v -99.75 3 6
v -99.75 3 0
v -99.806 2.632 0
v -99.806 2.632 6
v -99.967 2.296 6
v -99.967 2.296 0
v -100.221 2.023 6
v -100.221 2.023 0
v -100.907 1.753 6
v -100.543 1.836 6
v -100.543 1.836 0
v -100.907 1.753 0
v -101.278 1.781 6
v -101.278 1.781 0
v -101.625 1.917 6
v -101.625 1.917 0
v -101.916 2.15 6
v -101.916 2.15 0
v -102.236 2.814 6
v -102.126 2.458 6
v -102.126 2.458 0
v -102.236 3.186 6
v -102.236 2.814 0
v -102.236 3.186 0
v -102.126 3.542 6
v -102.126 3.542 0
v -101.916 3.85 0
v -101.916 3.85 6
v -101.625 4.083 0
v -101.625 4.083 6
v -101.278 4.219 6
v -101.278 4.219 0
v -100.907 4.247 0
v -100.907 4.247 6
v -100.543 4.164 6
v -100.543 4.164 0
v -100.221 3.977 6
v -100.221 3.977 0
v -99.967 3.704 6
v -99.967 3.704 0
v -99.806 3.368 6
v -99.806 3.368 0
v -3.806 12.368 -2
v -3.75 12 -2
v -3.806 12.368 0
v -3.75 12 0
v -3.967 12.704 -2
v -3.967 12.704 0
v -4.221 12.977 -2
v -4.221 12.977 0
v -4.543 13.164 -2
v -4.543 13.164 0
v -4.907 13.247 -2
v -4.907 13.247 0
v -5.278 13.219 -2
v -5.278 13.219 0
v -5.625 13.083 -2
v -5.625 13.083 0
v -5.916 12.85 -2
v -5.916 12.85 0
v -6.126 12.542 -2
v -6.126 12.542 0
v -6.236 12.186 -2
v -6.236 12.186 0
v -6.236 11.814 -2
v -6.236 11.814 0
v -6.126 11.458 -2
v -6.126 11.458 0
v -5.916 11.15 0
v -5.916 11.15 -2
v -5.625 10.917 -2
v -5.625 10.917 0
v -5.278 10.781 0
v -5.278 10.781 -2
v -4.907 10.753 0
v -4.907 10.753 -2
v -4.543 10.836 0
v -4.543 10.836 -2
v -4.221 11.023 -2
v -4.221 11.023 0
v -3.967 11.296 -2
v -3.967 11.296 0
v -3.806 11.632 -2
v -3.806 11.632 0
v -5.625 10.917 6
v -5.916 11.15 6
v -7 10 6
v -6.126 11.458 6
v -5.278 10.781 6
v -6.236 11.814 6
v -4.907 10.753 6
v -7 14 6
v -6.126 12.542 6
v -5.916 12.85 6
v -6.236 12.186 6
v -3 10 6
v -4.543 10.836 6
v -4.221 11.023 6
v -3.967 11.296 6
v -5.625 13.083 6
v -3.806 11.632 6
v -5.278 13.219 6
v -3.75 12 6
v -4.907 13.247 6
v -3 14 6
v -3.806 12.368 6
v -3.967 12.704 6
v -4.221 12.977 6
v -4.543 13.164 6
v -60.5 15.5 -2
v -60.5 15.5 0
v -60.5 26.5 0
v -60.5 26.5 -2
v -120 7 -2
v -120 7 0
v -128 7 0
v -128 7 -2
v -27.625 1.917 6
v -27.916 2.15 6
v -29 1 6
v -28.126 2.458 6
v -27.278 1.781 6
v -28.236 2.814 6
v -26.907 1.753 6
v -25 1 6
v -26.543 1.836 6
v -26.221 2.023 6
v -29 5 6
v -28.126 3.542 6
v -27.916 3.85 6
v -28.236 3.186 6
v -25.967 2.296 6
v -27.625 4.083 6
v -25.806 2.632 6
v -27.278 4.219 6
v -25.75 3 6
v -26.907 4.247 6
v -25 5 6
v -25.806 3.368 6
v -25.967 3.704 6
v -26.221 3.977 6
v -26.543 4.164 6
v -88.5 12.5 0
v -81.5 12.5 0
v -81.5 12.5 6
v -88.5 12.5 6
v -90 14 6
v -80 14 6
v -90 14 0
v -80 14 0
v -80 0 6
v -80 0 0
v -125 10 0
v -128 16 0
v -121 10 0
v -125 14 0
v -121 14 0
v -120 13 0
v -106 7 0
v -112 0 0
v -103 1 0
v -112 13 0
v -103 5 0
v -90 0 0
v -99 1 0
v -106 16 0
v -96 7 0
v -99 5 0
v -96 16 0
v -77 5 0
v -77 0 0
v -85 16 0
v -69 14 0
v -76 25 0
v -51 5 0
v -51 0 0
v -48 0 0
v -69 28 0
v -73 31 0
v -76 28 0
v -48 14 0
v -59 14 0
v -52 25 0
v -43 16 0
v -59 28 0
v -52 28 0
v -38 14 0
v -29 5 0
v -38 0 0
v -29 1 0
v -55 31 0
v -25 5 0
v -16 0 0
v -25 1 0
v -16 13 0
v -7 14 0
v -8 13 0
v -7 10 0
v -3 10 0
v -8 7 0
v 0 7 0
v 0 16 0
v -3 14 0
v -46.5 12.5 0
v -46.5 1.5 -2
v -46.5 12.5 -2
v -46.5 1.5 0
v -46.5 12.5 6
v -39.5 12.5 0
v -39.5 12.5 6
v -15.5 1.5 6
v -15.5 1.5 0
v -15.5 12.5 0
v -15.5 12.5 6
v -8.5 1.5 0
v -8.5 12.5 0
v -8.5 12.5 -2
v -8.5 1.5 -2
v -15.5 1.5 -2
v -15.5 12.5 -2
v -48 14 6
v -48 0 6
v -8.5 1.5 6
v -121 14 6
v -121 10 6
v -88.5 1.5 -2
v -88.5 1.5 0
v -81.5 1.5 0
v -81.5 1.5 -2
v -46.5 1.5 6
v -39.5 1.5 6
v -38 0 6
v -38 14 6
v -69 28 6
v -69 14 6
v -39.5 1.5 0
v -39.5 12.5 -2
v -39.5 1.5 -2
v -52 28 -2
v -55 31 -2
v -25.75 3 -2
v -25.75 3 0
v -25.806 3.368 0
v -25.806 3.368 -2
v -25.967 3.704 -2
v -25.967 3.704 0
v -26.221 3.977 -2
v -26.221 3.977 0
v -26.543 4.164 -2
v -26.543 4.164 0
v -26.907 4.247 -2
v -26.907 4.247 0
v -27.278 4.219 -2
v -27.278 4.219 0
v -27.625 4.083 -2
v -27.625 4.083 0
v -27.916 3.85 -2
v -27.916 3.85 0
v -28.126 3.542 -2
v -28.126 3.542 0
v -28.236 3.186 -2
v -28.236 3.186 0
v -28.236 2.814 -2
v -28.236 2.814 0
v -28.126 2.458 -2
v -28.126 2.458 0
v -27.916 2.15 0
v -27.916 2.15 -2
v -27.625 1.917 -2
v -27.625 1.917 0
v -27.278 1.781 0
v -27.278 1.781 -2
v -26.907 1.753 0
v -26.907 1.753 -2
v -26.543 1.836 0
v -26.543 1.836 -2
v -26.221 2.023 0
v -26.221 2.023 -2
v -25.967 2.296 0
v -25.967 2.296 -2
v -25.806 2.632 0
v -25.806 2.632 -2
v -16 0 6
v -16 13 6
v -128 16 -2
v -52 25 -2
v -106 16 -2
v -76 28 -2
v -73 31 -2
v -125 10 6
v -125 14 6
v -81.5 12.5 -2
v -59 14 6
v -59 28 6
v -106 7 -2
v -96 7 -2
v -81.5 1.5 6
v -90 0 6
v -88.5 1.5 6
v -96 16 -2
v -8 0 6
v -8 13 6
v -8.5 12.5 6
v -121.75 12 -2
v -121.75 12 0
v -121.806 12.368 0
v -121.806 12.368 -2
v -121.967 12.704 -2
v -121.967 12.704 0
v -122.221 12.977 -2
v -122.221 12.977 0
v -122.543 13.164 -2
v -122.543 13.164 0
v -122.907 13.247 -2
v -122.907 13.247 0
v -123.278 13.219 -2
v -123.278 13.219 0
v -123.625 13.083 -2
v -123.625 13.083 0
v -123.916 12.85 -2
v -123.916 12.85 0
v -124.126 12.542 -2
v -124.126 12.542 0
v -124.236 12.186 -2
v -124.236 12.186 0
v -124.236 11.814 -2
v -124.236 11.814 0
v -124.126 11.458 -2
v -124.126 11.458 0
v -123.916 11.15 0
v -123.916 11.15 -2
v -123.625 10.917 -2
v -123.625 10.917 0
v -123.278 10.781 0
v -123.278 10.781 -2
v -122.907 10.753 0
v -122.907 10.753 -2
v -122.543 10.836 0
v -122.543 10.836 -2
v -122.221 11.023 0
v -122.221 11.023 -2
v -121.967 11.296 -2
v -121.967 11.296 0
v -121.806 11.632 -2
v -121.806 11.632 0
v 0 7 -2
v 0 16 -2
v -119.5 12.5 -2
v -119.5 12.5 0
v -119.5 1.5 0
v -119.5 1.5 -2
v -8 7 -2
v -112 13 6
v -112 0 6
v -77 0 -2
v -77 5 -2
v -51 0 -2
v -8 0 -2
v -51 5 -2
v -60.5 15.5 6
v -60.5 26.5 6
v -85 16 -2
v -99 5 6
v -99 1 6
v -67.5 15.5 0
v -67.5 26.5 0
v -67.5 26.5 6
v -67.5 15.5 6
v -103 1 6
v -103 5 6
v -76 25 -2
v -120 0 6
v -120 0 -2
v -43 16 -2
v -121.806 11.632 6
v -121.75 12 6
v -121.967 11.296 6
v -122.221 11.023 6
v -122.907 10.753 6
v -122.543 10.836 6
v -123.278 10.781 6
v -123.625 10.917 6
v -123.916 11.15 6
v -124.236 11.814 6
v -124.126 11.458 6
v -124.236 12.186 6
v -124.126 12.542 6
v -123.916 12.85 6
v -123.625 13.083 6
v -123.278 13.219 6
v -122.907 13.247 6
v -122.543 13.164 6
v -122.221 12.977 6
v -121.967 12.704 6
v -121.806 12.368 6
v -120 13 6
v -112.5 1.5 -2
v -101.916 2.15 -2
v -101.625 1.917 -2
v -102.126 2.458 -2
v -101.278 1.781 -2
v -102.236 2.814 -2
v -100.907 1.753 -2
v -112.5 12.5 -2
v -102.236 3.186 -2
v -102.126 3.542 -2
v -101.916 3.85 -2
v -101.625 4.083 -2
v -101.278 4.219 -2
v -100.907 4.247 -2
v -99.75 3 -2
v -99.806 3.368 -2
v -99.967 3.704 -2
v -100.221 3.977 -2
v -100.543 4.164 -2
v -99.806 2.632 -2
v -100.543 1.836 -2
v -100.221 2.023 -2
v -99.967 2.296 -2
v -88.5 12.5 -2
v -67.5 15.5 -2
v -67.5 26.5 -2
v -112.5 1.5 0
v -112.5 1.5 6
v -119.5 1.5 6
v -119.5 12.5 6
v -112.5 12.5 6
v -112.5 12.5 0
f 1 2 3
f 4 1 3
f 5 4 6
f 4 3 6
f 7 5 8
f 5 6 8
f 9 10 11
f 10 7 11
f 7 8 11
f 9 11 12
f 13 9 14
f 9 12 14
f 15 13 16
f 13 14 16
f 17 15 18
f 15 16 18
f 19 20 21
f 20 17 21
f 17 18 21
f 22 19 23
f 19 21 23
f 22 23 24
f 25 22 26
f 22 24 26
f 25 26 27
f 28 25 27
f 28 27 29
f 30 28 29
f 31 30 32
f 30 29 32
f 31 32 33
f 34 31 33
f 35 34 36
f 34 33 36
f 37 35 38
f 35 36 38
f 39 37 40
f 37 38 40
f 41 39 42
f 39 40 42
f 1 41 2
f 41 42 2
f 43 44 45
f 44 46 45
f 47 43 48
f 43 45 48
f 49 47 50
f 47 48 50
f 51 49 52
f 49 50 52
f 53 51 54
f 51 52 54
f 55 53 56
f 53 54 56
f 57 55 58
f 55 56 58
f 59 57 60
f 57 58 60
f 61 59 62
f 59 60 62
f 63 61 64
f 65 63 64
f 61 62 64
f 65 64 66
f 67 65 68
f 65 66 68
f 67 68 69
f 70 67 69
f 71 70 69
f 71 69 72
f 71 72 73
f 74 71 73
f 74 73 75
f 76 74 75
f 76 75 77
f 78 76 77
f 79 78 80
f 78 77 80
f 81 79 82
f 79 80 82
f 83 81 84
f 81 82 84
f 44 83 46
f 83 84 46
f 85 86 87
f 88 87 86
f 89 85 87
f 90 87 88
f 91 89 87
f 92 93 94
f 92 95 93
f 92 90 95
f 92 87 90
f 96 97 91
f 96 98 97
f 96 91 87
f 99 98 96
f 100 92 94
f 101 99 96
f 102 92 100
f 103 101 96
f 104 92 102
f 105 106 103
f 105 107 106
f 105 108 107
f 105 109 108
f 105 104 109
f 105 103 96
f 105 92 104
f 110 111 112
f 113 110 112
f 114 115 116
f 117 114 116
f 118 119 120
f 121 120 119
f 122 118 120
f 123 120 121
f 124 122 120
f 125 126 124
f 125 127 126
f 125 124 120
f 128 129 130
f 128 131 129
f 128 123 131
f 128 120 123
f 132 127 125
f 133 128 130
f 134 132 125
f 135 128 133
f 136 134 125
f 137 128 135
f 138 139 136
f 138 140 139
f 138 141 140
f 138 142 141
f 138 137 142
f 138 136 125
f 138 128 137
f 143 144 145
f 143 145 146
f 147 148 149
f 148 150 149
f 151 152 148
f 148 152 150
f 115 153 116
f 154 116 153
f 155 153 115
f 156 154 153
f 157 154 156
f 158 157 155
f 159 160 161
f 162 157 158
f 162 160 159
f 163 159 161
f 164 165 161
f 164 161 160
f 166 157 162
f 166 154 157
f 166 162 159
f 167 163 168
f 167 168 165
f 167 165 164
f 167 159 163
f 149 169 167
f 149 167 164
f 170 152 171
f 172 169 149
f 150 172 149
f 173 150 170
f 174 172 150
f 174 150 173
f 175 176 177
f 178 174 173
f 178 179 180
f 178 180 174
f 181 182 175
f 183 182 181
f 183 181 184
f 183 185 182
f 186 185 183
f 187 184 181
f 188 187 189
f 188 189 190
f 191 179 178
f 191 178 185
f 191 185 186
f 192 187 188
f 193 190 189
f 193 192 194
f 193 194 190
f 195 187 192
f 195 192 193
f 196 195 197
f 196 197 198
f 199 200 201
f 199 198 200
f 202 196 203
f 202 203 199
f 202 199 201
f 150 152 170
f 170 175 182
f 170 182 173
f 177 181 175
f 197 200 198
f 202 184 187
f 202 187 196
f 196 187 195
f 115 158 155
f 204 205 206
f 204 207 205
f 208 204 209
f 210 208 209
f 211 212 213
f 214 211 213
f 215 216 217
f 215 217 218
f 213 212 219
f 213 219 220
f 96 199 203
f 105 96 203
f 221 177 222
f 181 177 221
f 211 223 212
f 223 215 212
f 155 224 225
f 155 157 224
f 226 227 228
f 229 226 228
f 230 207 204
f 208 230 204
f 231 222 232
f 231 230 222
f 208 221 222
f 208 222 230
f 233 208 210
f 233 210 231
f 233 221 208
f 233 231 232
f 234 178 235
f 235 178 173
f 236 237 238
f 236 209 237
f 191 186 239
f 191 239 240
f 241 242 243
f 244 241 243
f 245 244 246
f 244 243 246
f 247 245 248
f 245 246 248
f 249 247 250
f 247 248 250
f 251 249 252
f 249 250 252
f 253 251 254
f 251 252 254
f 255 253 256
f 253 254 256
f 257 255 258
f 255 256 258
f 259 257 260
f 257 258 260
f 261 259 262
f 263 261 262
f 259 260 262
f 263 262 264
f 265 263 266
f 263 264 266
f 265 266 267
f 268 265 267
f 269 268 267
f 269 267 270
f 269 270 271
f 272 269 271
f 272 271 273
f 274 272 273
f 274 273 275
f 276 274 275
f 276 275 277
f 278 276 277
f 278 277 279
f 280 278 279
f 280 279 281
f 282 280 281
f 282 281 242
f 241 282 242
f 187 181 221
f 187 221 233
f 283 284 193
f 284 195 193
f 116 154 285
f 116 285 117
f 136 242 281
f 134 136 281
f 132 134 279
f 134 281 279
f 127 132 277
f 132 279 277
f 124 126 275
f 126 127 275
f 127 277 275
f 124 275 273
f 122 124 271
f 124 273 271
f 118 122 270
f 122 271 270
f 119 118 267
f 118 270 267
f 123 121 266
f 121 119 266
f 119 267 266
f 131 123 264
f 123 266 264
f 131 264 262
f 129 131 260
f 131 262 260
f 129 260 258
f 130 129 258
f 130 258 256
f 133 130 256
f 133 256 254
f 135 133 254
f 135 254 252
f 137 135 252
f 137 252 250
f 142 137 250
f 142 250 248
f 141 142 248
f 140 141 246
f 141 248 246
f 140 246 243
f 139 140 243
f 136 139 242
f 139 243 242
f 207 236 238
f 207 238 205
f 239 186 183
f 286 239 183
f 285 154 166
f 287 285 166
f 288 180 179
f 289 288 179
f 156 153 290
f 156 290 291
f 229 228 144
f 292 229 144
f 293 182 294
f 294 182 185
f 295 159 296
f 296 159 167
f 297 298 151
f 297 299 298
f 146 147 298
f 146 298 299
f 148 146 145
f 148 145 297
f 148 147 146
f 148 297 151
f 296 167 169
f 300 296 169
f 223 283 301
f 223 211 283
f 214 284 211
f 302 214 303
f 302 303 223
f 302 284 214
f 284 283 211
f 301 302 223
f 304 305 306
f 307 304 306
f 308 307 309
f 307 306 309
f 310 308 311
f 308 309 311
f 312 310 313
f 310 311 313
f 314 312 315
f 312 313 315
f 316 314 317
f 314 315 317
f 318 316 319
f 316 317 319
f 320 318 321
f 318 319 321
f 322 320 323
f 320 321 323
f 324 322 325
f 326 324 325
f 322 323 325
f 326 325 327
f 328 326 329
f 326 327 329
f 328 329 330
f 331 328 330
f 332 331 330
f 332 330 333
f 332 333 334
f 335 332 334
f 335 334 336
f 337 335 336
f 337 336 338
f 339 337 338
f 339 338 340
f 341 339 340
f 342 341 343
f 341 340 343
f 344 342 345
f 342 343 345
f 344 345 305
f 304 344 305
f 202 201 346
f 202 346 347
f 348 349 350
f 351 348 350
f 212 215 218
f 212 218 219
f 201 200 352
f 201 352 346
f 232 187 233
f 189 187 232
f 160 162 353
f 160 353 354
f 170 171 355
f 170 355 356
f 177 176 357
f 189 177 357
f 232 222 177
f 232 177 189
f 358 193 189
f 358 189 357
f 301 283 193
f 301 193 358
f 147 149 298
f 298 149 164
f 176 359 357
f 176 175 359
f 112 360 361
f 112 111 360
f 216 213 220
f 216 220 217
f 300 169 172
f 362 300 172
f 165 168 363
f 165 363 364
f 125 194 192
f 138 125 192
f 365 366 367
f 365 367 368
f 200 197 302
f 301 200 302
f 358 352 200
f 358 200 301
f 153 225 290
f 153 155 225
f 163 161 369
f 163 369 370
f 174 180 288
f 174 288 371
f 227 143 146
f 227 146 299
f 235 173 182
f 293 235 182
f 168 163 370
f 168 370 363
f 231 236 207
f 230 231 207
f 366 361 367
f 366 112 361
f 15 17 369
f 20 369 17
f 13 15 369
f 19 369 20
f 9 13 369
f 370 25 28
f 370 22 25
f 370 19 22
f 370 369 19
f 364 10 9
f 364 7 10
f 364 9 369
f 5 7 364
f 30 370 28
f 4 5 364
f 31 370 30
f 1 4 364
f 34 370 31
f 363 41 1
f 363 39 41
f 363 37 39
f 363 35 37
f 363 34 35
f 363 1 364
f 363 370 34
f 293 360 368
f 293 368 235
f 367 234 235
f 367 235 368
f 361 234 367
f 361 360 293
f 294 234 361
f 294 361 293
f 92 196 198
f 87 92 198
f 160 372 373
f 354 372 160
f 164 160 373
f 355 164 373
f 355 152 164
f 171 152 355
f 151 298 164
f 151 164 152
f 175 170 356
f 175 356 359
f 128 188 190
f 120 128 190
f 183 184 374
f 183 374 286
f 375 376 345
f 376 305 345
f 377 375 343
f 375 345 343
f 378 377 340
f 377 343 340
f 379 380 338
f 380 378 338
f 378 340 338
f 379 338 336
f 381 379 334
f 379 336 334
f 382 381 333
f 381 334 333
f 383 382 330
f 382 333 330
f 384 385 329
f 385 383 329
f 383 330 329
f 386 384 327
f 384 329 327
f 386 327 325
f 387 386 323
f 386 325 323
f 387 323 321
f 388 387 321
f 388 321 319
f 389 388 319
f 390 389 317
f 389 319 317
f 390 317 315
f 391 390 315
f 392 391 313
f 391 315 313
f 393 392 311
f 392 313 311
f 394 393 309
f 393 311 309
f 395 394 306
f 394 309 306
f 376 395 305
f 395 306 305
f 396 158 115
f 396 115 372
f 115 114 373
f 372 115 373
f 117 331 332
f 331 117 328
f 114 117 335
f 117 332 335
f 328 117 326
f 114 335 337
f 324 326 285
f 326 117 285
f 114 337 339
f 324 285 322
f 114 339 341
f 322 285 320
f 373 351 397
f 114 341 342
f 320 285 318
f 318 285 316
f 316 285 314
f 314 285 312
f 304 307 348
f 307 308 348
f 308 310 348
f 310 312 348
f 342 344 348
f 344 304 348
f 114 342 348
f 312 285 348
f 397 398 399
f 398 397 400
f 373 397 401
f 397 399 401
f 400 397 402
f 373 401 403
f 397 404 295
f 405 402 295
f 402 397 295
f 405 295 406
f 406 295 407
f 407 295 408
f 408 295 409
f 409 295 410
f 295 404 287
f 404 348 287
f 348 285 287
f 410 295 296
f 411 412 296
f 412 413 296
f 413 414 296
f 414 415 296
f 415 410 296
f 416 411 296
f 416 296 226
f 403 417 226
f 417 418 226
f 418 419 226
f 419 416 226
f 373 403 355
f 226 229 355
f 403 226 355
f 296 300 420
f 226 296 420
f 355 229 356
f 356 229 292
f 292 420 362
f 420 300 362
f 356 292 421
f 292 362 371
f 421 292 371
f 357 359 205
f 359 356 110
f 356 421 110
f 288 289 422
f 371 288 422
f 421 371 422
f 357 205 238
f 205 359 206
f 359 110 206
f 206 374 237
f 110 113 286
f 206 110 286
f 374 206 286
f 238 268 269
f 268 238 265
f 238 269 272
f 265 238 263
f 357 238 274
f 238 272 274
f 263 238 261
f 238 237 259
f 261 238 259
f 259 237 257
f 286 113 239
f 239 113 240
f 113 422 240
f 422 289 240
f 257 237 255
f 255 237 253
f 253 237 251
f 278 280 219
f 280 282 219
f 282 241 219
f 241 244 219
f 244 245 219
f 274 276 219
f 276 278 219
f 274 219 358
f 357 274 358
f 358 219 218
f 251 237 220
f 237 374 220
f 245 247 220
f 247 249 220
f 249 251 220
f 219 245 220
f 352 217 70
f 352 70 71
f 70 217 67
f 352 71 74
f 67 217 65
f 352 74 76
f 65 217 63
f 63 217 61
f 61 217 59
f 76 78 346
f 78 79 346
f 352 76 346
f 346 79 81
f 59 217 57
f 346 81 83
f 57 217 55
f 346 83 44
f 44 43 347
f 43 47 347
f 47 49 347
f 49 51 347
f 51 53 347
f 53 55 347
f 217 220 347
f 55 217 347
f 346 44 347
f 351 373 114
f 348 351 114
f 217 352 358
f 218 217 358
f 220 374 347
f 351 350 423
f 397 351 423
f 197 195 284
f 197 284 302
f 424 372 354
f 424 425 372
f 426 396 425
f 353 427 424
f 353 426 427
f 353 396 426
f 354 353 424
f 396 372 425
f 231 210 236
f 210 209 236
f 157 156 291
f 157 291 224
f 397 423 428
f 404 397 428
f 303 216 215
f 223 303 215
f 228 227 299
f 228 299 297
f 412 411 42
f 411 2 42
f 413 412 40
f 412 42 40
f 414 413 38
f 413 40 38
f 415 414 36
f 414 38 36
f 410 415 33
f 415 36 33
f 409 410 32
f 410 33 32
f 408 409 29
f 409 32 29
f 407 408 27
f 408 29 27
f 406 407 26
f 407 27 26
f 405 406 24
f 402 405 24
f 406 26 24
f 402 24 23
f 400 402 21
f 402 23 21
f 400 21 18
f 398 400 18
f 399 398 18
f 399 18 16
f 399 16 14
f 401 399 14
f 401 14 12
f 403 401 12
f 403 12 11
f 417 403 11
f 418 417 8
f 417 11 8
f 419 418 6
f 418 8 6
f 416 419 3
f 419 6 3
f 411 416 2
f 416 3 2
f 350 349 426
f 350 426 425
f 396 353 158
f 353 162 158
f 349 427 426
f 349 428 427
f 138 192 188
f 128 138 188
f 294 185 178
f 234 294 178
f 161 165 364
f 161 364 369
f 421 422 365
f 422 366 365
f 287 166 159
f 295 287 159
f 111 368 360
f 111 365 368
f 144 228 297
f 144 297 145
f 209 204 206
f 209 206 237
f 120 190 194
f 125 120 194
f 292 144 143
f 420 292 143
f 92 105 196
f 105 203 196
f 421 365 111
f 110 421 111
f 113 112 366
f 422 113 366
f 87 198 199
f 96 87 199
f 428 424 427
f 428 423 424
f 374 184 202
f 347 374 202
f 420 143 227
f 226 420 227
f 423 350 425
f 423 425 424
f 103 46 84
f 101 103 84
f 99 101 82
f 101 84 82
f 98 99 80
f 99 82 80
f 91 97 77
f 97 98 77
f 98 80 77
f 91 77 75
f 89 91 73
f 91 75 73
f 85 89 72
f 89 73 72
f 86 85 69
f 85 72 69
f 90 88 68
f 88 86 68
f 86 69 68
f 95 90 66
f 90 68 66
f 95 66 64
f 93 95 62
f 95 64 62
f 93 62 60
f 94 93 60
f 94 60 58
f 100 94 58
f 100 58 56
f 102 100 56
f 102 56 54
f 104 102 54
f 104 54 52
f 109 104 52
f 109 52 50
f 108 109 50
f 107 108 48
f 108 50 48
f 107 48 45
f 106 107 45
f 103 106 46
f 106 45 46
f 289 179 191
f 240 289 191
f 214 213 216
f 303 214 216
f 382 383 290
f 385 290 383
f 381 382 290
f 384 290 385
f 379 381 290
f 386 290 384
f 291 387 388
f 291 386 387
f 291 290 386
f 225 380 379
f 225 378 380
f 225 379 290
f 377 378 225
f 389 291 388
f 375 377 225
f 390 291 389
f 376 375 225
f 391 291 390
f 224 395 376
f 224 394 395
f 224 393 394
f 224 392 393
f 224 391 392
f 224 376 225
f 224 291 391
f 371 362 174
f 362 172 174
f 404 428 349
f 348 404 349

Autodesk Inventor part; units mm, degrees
ref_plane "YZ Plane" through (0, 0, 0) normal (1, 0, 0) x (0, 1, 0)
ref_plane "XZ Plane" through (0, 0, 0) normal (0, 1, 0) x (-1, 0, 0)
ref_plane "XY Plane" through (0, 0, 0) normal (0, 0, 1) x (1, 0, 0)
sketch "Sketch1" plane through (0, 0, 0) normal (0, 0, 1) x (1, 0, 0)
  line L0 (-64, 31) -> (-73, 31)
  line L1 (-76, 28) -> (-76, 25)
  line L2 (-85, 16) -> (-76, 25)
  line L3 (-76, 28) -> (-73, 31)
  line L4 (-64, 31) -> (-55, 31)
  line L5 (-52, 28) -> (-52, 25)
  line L6 (-43, 16) -> (-52, 25)
  line L7 (-52, 28) -> (-55, 31)
  line L8 (-43, 16) -> (0, 16)
  line L9 (-77, 0) -> (-77, 5)
  line L10 (-77, 5) -> (-51, 5)
  line L11 (-51, 5) -> (-51, 0)
  line L12 (-106, 16) -> (-106, 7)
  line L13 (-106, 7) -> (-96, 7)
  line L14 (-96, 7) -> (-96, 16)
  line L15 (-128, 16) -> (-106, 16)
  line L16 (-96, 16) -> (-85, 16)
  line L17 (-120, 0) -> (-120, 7)
  line L18 (-120, 7) -> (-128, 7)
  line L19 (-120, 0) -> (-77, 0)
  line L20 (-128, 16) -> (-128, 7)
  line L21 (-8, 0) -> (-8, 7)
  line L22 (-8, 7) -> (0, 7)
  line L23 (-51, 0) -> (-8, 0)
  line L24 (0, 7) -> (0, 16)
  point P0 (0, 0)
  dimension "d0" = 128
  dimension "d6" = 3
  dimension "d67" = 5
  dimension "d71" = 22
  dimension "d74" = 9
  dimension "d75" = 10
  dimension "d93" = 7
  dimension "d94" = 8
  dimension "d95" = 7
extrude "Extrusion1" add sketch "Sketch1" against normal blind 2
sketch "Sketch2" plane through (0, 0, 0) normal (0, 0, 1) x (1, 0, 0)
  line L0 (-121, 10) -> (-125, 10)
  line L1 (-125, 10) -> (-125, 14)
  line L2 (-125, 14) -> (-121, 14)
  line L3 (-121, 14) -> (-121, 10)
  line L4 (-90, 0) -> (-80, 0)
  line L5 (-80, 0) -> (-80, 14)
  line L6 (-80, 14) -> (-90, 14)
  line L7 (-90, 14) -> (-90, 0)
  line L8 (-99, 1) -> (-103, 1)
  line L9 (-103, 1) -> (-103, 5)
  line L10 (-103, 5) -> (-99, 5)
  line L11 (-99, 5) -> (-99, 1)
  line L12 (-7, 10) -> (-3, 10)
  line L13 (-3, 10) -> (-3, 14)
  line L14 (-3, 14) -> (-7, 14)
  line L15 (-7, 14) -> (-7, 10)
  line L16 (-29, 1) -> (-25, 1)
  line L17 (-25, 1) -> (-25, 5)
  line L18 (-25, 5) -> (-29, 5)
  line L19 (-29, 5) -> (-29, 1)
  line L20 (-112, 13) -> (-120, 13)
  line L21 (-120, 13) -> (-120, 0)
  line L22 (-112, 13) -> (-112, 0)
  circle A0 centre (-123, 12) radius 1.25
  circle A1 centre (-101, 3) radius 1.25
  circle A2 centre (-27, 3) radius 1.25
  circle A3 centre (-5, 12) radius 1.25
  line L23 (-120, 0) -> (-112, 0)
  line L24 (-119.5, 12.5) -> (-119.5, 1.5)
  line L25 (-119.5, 1.5) -> (-112.5, 1.5)
  line L26 (-112.5, 1.5) -> (-112.5, 12.5)
  line L27 (-112.5, 12.5) -> (-119.5, 12.5)
  line L28 (-88.5, 12.5) -> (-88.5, 1.5)
  line L29 (-88.5, 1.5) -> (-81.5, 1.5)
  line L30 (-81.5, 1.5) -> (-81.5, 12.5)
  line L31 (-81.5, 12.5) -> (-88.5, 12.5)
  line L32 (-69, 14) -> (-59, 14)
  line L33 (-59, 14) -> (-59, 28)
  line L34 (-59, 28) -> (-69, 28)
  line L35 (-69, 28) -> (-69, 14)
  line L36 (-67.5, 26.5) -> (-67.5, 15.5)
  line L37 (-67.5, 15.5) -> (-60.5, 15.5)
  line L38 (-60.5, 15.5) -> (-60.5, 26.5)
  line L39 (-60.5, 26.5) -> (-67.5, 26.5)
  line L40 (-38, 0) -> (-48, 0)
  line L41 (-48, 0) -> (-48, 14)
  line L42 (-48, 14) -> (-38, 14)
  line L43 (-38, 14) -> (-38, 0)
  line L44 (-16, 13) -> (-8, 13)
  line L45 (-8, 13) -> (-8, 0)
  line L46 (-16, 13) -> (-16, 0)
  line L47 (-8, 0) -> (-16, 0)
  line L48 (-8.5, 12.5) -> (-8.5, 1.5)
  line L49 (-8.5, 1.5) -> (-15.5, 1.5)
  line L50 (-15.5, 1.5) -> (-15.5, 12.5)
  line L51 (-15.5, 12.5) -> (-8.5, 12.5)
  line L52 (-39.5, 12.5) -> (-39.5, 1.5)
  line L53 (-39.5, 1.5) -> (-46.5, 1.5)
  line L54 (-46.5, 1.5) -> (-46.5, 12.5)
  line L55 (-46.5, 12.5) -> (-39.5, 12.5)
  dimension "d49" = 2.5
  dimension "d50" = 2.5
  dimension "d51" = 2.5
  dimension "d52" = 2.5
  dimension "d69" = 13
sketch "Sketch10" plane through (0, 0, 0) normal (0, 0, 1) x (1, 0, 0)
  line L0 (-121, 10) -> (-125, 10)
  line L1 (-125, 10) -> (-125, 14)
  line L2 (-125, 14) -> (-121, 14)
  line L3 (-121, 14) -> (-121, 10)
  line L4 (-25, 1) -> (-25, 5)
  line L5 (-7, 14) -> (-7, 10)
  line L6 (-7, 10) -> (-3, 10)
  line L7 (-3, 10) -> (-3, 14)
  line L8 (-3, 14) -> (-7, 14)
  line L9 (-29, 1) -> (-25, 1)
  line L10 (-25, 5) -> (-29, 5)
  line L11 (-29, 5) -> (-29, 1)
  circle A0 centre (-123, 12) radius 1.25
  circle A1 centre (-27, 3) radius 1.25
  circle A2 centre (-5, 12) radius 1.25
  line L12 (-90, 0) -> (-80, 0)
  line L13 (-80, 0) -> (-80, 14)
  line L14 (-80, 14) -> (-90, 14)
  line L15 (-90, 14) -> (-90, 0)
  line L16 (-99, 1) -> (-103, 1)
  line L17 (-103, 1) -> (-103, 5)
  line L18 (-103, 5) -> (-99, 5)
  line L19 (-99, 5) -> (-99, 1)
  line L20 (-112, 13) -> (-120, 13)
  line L21 (-120, 13) -> (-120, 0)
  line L22 (-112, 13) -> (-112, 0)
  circle A3 centre (-101, 3) radius 1.25
  line L23 (-120, 0) -> (-112, 0)
  line L24 (-119.5, 12.5) -> (-119.5, 1.5)
  line L25 (-119.5, 1.5) -> (-112.5, 1.5)
  line L26 (-112.5, 1.5) -> (-112.5, 12.5)
  line L27 (-112.5, 12.5) -> (-119.5, 12.5)
  line L28 (-88.5, 12.5) -> (-88.5, 1.5)
  line L29 (-88.5, 1.5) -> (-81.5, 1.5)
  line L30 (-81.5, 1.5) -> (-81.5, 12.5)
  line L31 (-81.5, 12.5) -> (-88.5, 12.5)
  line L32 (-69, 14) -> (-59, 14)
  line L33 (-59, 14) -> (-59, 28)
  line L34 (-59, 28) -> (-69, 28)
  line L35 (-69, 28) -> (-69, 14)
  line L36 (-67.5, 26.5) -> (-67.5, 15.5)
  line L37 (-60.5, 26.5) -> (-67.5, 26.5)
  line L38 (-60.5, 15.5) -> (-60.5, 26.5)
  line L39 (-67.5, 15.5) -> (-60.5, 15.5)
  line L40 (-15.5, 1.5) -> (-15.5, 12.5)
  line L41 (-16, 13) -> (-16, 0)
  line L42 (-8.5, 1.5) -> (-15.5, 1.5)
  line L43 (-8, 0) -> (-16, 0)
  line L44 (-8.5, 12.5) -> (-8.5, 1.5)
  line L45 (-8, 13) -> (-8, 0)
  line L46 (-15.5, 12.5) -> (-8.5, 12.5)
  line L47 (-16, 13) -> (-8, 13)
  line L48 (-38, 0) -> (-48, 0)
  line L49 (-48, 0) -> (-48, 14)
  line L50 (-48, 14) -> (-38, 14)
  line L51 (-38, 14) -> (-38, 0)
  line L52 (-39.5, 12.5) -> (-39.5, 1.5)
  line L53 (-39.5, 1.5) -> (-46.5, 1.5)
  line L54 (-46.5, 1.5) -> (-46.5, 12.5)
  line L55 (-46.5, 12.5) -> (-39.5, 12.5)
  point P0 (-100.5385, 17.107)
  point P1 (-110.5385, 3.107)
  point P2 (-100.5385, 3.107)
  point P3 (-141.5385, 3.107)
  point P4 (-131.5385, 3.107)
  point P5 (-183.5385, 3.107)
  point P6 (-173.5385, 3.107)
  point P7 (-214.5385, 3.107)
  point P8 (-204.5385, 3.107)
  point P9 (-214.5385, 17.107)
  point P10 (0, 16)
  point P11 (0, 0)
  dimension "d62" = 2.5
  dimension "d64" = 2.5
  dimension "d65" = 2.5
extrude "Extrusion2" cut sketch "Sketch2" against normal blind 2 contours A0 | A1 | A2 | A3 | L27 L26 L25 L24 | L31 L30 L29 L28 | L39 L38 L37 L36 | L48 L49 L50 L51 | L52 L53 L54 L55
extrude "Extrusion7" add sketch "Sketch10" along normal blind 6
properties part number "Infravermelhos_revisto_2"
